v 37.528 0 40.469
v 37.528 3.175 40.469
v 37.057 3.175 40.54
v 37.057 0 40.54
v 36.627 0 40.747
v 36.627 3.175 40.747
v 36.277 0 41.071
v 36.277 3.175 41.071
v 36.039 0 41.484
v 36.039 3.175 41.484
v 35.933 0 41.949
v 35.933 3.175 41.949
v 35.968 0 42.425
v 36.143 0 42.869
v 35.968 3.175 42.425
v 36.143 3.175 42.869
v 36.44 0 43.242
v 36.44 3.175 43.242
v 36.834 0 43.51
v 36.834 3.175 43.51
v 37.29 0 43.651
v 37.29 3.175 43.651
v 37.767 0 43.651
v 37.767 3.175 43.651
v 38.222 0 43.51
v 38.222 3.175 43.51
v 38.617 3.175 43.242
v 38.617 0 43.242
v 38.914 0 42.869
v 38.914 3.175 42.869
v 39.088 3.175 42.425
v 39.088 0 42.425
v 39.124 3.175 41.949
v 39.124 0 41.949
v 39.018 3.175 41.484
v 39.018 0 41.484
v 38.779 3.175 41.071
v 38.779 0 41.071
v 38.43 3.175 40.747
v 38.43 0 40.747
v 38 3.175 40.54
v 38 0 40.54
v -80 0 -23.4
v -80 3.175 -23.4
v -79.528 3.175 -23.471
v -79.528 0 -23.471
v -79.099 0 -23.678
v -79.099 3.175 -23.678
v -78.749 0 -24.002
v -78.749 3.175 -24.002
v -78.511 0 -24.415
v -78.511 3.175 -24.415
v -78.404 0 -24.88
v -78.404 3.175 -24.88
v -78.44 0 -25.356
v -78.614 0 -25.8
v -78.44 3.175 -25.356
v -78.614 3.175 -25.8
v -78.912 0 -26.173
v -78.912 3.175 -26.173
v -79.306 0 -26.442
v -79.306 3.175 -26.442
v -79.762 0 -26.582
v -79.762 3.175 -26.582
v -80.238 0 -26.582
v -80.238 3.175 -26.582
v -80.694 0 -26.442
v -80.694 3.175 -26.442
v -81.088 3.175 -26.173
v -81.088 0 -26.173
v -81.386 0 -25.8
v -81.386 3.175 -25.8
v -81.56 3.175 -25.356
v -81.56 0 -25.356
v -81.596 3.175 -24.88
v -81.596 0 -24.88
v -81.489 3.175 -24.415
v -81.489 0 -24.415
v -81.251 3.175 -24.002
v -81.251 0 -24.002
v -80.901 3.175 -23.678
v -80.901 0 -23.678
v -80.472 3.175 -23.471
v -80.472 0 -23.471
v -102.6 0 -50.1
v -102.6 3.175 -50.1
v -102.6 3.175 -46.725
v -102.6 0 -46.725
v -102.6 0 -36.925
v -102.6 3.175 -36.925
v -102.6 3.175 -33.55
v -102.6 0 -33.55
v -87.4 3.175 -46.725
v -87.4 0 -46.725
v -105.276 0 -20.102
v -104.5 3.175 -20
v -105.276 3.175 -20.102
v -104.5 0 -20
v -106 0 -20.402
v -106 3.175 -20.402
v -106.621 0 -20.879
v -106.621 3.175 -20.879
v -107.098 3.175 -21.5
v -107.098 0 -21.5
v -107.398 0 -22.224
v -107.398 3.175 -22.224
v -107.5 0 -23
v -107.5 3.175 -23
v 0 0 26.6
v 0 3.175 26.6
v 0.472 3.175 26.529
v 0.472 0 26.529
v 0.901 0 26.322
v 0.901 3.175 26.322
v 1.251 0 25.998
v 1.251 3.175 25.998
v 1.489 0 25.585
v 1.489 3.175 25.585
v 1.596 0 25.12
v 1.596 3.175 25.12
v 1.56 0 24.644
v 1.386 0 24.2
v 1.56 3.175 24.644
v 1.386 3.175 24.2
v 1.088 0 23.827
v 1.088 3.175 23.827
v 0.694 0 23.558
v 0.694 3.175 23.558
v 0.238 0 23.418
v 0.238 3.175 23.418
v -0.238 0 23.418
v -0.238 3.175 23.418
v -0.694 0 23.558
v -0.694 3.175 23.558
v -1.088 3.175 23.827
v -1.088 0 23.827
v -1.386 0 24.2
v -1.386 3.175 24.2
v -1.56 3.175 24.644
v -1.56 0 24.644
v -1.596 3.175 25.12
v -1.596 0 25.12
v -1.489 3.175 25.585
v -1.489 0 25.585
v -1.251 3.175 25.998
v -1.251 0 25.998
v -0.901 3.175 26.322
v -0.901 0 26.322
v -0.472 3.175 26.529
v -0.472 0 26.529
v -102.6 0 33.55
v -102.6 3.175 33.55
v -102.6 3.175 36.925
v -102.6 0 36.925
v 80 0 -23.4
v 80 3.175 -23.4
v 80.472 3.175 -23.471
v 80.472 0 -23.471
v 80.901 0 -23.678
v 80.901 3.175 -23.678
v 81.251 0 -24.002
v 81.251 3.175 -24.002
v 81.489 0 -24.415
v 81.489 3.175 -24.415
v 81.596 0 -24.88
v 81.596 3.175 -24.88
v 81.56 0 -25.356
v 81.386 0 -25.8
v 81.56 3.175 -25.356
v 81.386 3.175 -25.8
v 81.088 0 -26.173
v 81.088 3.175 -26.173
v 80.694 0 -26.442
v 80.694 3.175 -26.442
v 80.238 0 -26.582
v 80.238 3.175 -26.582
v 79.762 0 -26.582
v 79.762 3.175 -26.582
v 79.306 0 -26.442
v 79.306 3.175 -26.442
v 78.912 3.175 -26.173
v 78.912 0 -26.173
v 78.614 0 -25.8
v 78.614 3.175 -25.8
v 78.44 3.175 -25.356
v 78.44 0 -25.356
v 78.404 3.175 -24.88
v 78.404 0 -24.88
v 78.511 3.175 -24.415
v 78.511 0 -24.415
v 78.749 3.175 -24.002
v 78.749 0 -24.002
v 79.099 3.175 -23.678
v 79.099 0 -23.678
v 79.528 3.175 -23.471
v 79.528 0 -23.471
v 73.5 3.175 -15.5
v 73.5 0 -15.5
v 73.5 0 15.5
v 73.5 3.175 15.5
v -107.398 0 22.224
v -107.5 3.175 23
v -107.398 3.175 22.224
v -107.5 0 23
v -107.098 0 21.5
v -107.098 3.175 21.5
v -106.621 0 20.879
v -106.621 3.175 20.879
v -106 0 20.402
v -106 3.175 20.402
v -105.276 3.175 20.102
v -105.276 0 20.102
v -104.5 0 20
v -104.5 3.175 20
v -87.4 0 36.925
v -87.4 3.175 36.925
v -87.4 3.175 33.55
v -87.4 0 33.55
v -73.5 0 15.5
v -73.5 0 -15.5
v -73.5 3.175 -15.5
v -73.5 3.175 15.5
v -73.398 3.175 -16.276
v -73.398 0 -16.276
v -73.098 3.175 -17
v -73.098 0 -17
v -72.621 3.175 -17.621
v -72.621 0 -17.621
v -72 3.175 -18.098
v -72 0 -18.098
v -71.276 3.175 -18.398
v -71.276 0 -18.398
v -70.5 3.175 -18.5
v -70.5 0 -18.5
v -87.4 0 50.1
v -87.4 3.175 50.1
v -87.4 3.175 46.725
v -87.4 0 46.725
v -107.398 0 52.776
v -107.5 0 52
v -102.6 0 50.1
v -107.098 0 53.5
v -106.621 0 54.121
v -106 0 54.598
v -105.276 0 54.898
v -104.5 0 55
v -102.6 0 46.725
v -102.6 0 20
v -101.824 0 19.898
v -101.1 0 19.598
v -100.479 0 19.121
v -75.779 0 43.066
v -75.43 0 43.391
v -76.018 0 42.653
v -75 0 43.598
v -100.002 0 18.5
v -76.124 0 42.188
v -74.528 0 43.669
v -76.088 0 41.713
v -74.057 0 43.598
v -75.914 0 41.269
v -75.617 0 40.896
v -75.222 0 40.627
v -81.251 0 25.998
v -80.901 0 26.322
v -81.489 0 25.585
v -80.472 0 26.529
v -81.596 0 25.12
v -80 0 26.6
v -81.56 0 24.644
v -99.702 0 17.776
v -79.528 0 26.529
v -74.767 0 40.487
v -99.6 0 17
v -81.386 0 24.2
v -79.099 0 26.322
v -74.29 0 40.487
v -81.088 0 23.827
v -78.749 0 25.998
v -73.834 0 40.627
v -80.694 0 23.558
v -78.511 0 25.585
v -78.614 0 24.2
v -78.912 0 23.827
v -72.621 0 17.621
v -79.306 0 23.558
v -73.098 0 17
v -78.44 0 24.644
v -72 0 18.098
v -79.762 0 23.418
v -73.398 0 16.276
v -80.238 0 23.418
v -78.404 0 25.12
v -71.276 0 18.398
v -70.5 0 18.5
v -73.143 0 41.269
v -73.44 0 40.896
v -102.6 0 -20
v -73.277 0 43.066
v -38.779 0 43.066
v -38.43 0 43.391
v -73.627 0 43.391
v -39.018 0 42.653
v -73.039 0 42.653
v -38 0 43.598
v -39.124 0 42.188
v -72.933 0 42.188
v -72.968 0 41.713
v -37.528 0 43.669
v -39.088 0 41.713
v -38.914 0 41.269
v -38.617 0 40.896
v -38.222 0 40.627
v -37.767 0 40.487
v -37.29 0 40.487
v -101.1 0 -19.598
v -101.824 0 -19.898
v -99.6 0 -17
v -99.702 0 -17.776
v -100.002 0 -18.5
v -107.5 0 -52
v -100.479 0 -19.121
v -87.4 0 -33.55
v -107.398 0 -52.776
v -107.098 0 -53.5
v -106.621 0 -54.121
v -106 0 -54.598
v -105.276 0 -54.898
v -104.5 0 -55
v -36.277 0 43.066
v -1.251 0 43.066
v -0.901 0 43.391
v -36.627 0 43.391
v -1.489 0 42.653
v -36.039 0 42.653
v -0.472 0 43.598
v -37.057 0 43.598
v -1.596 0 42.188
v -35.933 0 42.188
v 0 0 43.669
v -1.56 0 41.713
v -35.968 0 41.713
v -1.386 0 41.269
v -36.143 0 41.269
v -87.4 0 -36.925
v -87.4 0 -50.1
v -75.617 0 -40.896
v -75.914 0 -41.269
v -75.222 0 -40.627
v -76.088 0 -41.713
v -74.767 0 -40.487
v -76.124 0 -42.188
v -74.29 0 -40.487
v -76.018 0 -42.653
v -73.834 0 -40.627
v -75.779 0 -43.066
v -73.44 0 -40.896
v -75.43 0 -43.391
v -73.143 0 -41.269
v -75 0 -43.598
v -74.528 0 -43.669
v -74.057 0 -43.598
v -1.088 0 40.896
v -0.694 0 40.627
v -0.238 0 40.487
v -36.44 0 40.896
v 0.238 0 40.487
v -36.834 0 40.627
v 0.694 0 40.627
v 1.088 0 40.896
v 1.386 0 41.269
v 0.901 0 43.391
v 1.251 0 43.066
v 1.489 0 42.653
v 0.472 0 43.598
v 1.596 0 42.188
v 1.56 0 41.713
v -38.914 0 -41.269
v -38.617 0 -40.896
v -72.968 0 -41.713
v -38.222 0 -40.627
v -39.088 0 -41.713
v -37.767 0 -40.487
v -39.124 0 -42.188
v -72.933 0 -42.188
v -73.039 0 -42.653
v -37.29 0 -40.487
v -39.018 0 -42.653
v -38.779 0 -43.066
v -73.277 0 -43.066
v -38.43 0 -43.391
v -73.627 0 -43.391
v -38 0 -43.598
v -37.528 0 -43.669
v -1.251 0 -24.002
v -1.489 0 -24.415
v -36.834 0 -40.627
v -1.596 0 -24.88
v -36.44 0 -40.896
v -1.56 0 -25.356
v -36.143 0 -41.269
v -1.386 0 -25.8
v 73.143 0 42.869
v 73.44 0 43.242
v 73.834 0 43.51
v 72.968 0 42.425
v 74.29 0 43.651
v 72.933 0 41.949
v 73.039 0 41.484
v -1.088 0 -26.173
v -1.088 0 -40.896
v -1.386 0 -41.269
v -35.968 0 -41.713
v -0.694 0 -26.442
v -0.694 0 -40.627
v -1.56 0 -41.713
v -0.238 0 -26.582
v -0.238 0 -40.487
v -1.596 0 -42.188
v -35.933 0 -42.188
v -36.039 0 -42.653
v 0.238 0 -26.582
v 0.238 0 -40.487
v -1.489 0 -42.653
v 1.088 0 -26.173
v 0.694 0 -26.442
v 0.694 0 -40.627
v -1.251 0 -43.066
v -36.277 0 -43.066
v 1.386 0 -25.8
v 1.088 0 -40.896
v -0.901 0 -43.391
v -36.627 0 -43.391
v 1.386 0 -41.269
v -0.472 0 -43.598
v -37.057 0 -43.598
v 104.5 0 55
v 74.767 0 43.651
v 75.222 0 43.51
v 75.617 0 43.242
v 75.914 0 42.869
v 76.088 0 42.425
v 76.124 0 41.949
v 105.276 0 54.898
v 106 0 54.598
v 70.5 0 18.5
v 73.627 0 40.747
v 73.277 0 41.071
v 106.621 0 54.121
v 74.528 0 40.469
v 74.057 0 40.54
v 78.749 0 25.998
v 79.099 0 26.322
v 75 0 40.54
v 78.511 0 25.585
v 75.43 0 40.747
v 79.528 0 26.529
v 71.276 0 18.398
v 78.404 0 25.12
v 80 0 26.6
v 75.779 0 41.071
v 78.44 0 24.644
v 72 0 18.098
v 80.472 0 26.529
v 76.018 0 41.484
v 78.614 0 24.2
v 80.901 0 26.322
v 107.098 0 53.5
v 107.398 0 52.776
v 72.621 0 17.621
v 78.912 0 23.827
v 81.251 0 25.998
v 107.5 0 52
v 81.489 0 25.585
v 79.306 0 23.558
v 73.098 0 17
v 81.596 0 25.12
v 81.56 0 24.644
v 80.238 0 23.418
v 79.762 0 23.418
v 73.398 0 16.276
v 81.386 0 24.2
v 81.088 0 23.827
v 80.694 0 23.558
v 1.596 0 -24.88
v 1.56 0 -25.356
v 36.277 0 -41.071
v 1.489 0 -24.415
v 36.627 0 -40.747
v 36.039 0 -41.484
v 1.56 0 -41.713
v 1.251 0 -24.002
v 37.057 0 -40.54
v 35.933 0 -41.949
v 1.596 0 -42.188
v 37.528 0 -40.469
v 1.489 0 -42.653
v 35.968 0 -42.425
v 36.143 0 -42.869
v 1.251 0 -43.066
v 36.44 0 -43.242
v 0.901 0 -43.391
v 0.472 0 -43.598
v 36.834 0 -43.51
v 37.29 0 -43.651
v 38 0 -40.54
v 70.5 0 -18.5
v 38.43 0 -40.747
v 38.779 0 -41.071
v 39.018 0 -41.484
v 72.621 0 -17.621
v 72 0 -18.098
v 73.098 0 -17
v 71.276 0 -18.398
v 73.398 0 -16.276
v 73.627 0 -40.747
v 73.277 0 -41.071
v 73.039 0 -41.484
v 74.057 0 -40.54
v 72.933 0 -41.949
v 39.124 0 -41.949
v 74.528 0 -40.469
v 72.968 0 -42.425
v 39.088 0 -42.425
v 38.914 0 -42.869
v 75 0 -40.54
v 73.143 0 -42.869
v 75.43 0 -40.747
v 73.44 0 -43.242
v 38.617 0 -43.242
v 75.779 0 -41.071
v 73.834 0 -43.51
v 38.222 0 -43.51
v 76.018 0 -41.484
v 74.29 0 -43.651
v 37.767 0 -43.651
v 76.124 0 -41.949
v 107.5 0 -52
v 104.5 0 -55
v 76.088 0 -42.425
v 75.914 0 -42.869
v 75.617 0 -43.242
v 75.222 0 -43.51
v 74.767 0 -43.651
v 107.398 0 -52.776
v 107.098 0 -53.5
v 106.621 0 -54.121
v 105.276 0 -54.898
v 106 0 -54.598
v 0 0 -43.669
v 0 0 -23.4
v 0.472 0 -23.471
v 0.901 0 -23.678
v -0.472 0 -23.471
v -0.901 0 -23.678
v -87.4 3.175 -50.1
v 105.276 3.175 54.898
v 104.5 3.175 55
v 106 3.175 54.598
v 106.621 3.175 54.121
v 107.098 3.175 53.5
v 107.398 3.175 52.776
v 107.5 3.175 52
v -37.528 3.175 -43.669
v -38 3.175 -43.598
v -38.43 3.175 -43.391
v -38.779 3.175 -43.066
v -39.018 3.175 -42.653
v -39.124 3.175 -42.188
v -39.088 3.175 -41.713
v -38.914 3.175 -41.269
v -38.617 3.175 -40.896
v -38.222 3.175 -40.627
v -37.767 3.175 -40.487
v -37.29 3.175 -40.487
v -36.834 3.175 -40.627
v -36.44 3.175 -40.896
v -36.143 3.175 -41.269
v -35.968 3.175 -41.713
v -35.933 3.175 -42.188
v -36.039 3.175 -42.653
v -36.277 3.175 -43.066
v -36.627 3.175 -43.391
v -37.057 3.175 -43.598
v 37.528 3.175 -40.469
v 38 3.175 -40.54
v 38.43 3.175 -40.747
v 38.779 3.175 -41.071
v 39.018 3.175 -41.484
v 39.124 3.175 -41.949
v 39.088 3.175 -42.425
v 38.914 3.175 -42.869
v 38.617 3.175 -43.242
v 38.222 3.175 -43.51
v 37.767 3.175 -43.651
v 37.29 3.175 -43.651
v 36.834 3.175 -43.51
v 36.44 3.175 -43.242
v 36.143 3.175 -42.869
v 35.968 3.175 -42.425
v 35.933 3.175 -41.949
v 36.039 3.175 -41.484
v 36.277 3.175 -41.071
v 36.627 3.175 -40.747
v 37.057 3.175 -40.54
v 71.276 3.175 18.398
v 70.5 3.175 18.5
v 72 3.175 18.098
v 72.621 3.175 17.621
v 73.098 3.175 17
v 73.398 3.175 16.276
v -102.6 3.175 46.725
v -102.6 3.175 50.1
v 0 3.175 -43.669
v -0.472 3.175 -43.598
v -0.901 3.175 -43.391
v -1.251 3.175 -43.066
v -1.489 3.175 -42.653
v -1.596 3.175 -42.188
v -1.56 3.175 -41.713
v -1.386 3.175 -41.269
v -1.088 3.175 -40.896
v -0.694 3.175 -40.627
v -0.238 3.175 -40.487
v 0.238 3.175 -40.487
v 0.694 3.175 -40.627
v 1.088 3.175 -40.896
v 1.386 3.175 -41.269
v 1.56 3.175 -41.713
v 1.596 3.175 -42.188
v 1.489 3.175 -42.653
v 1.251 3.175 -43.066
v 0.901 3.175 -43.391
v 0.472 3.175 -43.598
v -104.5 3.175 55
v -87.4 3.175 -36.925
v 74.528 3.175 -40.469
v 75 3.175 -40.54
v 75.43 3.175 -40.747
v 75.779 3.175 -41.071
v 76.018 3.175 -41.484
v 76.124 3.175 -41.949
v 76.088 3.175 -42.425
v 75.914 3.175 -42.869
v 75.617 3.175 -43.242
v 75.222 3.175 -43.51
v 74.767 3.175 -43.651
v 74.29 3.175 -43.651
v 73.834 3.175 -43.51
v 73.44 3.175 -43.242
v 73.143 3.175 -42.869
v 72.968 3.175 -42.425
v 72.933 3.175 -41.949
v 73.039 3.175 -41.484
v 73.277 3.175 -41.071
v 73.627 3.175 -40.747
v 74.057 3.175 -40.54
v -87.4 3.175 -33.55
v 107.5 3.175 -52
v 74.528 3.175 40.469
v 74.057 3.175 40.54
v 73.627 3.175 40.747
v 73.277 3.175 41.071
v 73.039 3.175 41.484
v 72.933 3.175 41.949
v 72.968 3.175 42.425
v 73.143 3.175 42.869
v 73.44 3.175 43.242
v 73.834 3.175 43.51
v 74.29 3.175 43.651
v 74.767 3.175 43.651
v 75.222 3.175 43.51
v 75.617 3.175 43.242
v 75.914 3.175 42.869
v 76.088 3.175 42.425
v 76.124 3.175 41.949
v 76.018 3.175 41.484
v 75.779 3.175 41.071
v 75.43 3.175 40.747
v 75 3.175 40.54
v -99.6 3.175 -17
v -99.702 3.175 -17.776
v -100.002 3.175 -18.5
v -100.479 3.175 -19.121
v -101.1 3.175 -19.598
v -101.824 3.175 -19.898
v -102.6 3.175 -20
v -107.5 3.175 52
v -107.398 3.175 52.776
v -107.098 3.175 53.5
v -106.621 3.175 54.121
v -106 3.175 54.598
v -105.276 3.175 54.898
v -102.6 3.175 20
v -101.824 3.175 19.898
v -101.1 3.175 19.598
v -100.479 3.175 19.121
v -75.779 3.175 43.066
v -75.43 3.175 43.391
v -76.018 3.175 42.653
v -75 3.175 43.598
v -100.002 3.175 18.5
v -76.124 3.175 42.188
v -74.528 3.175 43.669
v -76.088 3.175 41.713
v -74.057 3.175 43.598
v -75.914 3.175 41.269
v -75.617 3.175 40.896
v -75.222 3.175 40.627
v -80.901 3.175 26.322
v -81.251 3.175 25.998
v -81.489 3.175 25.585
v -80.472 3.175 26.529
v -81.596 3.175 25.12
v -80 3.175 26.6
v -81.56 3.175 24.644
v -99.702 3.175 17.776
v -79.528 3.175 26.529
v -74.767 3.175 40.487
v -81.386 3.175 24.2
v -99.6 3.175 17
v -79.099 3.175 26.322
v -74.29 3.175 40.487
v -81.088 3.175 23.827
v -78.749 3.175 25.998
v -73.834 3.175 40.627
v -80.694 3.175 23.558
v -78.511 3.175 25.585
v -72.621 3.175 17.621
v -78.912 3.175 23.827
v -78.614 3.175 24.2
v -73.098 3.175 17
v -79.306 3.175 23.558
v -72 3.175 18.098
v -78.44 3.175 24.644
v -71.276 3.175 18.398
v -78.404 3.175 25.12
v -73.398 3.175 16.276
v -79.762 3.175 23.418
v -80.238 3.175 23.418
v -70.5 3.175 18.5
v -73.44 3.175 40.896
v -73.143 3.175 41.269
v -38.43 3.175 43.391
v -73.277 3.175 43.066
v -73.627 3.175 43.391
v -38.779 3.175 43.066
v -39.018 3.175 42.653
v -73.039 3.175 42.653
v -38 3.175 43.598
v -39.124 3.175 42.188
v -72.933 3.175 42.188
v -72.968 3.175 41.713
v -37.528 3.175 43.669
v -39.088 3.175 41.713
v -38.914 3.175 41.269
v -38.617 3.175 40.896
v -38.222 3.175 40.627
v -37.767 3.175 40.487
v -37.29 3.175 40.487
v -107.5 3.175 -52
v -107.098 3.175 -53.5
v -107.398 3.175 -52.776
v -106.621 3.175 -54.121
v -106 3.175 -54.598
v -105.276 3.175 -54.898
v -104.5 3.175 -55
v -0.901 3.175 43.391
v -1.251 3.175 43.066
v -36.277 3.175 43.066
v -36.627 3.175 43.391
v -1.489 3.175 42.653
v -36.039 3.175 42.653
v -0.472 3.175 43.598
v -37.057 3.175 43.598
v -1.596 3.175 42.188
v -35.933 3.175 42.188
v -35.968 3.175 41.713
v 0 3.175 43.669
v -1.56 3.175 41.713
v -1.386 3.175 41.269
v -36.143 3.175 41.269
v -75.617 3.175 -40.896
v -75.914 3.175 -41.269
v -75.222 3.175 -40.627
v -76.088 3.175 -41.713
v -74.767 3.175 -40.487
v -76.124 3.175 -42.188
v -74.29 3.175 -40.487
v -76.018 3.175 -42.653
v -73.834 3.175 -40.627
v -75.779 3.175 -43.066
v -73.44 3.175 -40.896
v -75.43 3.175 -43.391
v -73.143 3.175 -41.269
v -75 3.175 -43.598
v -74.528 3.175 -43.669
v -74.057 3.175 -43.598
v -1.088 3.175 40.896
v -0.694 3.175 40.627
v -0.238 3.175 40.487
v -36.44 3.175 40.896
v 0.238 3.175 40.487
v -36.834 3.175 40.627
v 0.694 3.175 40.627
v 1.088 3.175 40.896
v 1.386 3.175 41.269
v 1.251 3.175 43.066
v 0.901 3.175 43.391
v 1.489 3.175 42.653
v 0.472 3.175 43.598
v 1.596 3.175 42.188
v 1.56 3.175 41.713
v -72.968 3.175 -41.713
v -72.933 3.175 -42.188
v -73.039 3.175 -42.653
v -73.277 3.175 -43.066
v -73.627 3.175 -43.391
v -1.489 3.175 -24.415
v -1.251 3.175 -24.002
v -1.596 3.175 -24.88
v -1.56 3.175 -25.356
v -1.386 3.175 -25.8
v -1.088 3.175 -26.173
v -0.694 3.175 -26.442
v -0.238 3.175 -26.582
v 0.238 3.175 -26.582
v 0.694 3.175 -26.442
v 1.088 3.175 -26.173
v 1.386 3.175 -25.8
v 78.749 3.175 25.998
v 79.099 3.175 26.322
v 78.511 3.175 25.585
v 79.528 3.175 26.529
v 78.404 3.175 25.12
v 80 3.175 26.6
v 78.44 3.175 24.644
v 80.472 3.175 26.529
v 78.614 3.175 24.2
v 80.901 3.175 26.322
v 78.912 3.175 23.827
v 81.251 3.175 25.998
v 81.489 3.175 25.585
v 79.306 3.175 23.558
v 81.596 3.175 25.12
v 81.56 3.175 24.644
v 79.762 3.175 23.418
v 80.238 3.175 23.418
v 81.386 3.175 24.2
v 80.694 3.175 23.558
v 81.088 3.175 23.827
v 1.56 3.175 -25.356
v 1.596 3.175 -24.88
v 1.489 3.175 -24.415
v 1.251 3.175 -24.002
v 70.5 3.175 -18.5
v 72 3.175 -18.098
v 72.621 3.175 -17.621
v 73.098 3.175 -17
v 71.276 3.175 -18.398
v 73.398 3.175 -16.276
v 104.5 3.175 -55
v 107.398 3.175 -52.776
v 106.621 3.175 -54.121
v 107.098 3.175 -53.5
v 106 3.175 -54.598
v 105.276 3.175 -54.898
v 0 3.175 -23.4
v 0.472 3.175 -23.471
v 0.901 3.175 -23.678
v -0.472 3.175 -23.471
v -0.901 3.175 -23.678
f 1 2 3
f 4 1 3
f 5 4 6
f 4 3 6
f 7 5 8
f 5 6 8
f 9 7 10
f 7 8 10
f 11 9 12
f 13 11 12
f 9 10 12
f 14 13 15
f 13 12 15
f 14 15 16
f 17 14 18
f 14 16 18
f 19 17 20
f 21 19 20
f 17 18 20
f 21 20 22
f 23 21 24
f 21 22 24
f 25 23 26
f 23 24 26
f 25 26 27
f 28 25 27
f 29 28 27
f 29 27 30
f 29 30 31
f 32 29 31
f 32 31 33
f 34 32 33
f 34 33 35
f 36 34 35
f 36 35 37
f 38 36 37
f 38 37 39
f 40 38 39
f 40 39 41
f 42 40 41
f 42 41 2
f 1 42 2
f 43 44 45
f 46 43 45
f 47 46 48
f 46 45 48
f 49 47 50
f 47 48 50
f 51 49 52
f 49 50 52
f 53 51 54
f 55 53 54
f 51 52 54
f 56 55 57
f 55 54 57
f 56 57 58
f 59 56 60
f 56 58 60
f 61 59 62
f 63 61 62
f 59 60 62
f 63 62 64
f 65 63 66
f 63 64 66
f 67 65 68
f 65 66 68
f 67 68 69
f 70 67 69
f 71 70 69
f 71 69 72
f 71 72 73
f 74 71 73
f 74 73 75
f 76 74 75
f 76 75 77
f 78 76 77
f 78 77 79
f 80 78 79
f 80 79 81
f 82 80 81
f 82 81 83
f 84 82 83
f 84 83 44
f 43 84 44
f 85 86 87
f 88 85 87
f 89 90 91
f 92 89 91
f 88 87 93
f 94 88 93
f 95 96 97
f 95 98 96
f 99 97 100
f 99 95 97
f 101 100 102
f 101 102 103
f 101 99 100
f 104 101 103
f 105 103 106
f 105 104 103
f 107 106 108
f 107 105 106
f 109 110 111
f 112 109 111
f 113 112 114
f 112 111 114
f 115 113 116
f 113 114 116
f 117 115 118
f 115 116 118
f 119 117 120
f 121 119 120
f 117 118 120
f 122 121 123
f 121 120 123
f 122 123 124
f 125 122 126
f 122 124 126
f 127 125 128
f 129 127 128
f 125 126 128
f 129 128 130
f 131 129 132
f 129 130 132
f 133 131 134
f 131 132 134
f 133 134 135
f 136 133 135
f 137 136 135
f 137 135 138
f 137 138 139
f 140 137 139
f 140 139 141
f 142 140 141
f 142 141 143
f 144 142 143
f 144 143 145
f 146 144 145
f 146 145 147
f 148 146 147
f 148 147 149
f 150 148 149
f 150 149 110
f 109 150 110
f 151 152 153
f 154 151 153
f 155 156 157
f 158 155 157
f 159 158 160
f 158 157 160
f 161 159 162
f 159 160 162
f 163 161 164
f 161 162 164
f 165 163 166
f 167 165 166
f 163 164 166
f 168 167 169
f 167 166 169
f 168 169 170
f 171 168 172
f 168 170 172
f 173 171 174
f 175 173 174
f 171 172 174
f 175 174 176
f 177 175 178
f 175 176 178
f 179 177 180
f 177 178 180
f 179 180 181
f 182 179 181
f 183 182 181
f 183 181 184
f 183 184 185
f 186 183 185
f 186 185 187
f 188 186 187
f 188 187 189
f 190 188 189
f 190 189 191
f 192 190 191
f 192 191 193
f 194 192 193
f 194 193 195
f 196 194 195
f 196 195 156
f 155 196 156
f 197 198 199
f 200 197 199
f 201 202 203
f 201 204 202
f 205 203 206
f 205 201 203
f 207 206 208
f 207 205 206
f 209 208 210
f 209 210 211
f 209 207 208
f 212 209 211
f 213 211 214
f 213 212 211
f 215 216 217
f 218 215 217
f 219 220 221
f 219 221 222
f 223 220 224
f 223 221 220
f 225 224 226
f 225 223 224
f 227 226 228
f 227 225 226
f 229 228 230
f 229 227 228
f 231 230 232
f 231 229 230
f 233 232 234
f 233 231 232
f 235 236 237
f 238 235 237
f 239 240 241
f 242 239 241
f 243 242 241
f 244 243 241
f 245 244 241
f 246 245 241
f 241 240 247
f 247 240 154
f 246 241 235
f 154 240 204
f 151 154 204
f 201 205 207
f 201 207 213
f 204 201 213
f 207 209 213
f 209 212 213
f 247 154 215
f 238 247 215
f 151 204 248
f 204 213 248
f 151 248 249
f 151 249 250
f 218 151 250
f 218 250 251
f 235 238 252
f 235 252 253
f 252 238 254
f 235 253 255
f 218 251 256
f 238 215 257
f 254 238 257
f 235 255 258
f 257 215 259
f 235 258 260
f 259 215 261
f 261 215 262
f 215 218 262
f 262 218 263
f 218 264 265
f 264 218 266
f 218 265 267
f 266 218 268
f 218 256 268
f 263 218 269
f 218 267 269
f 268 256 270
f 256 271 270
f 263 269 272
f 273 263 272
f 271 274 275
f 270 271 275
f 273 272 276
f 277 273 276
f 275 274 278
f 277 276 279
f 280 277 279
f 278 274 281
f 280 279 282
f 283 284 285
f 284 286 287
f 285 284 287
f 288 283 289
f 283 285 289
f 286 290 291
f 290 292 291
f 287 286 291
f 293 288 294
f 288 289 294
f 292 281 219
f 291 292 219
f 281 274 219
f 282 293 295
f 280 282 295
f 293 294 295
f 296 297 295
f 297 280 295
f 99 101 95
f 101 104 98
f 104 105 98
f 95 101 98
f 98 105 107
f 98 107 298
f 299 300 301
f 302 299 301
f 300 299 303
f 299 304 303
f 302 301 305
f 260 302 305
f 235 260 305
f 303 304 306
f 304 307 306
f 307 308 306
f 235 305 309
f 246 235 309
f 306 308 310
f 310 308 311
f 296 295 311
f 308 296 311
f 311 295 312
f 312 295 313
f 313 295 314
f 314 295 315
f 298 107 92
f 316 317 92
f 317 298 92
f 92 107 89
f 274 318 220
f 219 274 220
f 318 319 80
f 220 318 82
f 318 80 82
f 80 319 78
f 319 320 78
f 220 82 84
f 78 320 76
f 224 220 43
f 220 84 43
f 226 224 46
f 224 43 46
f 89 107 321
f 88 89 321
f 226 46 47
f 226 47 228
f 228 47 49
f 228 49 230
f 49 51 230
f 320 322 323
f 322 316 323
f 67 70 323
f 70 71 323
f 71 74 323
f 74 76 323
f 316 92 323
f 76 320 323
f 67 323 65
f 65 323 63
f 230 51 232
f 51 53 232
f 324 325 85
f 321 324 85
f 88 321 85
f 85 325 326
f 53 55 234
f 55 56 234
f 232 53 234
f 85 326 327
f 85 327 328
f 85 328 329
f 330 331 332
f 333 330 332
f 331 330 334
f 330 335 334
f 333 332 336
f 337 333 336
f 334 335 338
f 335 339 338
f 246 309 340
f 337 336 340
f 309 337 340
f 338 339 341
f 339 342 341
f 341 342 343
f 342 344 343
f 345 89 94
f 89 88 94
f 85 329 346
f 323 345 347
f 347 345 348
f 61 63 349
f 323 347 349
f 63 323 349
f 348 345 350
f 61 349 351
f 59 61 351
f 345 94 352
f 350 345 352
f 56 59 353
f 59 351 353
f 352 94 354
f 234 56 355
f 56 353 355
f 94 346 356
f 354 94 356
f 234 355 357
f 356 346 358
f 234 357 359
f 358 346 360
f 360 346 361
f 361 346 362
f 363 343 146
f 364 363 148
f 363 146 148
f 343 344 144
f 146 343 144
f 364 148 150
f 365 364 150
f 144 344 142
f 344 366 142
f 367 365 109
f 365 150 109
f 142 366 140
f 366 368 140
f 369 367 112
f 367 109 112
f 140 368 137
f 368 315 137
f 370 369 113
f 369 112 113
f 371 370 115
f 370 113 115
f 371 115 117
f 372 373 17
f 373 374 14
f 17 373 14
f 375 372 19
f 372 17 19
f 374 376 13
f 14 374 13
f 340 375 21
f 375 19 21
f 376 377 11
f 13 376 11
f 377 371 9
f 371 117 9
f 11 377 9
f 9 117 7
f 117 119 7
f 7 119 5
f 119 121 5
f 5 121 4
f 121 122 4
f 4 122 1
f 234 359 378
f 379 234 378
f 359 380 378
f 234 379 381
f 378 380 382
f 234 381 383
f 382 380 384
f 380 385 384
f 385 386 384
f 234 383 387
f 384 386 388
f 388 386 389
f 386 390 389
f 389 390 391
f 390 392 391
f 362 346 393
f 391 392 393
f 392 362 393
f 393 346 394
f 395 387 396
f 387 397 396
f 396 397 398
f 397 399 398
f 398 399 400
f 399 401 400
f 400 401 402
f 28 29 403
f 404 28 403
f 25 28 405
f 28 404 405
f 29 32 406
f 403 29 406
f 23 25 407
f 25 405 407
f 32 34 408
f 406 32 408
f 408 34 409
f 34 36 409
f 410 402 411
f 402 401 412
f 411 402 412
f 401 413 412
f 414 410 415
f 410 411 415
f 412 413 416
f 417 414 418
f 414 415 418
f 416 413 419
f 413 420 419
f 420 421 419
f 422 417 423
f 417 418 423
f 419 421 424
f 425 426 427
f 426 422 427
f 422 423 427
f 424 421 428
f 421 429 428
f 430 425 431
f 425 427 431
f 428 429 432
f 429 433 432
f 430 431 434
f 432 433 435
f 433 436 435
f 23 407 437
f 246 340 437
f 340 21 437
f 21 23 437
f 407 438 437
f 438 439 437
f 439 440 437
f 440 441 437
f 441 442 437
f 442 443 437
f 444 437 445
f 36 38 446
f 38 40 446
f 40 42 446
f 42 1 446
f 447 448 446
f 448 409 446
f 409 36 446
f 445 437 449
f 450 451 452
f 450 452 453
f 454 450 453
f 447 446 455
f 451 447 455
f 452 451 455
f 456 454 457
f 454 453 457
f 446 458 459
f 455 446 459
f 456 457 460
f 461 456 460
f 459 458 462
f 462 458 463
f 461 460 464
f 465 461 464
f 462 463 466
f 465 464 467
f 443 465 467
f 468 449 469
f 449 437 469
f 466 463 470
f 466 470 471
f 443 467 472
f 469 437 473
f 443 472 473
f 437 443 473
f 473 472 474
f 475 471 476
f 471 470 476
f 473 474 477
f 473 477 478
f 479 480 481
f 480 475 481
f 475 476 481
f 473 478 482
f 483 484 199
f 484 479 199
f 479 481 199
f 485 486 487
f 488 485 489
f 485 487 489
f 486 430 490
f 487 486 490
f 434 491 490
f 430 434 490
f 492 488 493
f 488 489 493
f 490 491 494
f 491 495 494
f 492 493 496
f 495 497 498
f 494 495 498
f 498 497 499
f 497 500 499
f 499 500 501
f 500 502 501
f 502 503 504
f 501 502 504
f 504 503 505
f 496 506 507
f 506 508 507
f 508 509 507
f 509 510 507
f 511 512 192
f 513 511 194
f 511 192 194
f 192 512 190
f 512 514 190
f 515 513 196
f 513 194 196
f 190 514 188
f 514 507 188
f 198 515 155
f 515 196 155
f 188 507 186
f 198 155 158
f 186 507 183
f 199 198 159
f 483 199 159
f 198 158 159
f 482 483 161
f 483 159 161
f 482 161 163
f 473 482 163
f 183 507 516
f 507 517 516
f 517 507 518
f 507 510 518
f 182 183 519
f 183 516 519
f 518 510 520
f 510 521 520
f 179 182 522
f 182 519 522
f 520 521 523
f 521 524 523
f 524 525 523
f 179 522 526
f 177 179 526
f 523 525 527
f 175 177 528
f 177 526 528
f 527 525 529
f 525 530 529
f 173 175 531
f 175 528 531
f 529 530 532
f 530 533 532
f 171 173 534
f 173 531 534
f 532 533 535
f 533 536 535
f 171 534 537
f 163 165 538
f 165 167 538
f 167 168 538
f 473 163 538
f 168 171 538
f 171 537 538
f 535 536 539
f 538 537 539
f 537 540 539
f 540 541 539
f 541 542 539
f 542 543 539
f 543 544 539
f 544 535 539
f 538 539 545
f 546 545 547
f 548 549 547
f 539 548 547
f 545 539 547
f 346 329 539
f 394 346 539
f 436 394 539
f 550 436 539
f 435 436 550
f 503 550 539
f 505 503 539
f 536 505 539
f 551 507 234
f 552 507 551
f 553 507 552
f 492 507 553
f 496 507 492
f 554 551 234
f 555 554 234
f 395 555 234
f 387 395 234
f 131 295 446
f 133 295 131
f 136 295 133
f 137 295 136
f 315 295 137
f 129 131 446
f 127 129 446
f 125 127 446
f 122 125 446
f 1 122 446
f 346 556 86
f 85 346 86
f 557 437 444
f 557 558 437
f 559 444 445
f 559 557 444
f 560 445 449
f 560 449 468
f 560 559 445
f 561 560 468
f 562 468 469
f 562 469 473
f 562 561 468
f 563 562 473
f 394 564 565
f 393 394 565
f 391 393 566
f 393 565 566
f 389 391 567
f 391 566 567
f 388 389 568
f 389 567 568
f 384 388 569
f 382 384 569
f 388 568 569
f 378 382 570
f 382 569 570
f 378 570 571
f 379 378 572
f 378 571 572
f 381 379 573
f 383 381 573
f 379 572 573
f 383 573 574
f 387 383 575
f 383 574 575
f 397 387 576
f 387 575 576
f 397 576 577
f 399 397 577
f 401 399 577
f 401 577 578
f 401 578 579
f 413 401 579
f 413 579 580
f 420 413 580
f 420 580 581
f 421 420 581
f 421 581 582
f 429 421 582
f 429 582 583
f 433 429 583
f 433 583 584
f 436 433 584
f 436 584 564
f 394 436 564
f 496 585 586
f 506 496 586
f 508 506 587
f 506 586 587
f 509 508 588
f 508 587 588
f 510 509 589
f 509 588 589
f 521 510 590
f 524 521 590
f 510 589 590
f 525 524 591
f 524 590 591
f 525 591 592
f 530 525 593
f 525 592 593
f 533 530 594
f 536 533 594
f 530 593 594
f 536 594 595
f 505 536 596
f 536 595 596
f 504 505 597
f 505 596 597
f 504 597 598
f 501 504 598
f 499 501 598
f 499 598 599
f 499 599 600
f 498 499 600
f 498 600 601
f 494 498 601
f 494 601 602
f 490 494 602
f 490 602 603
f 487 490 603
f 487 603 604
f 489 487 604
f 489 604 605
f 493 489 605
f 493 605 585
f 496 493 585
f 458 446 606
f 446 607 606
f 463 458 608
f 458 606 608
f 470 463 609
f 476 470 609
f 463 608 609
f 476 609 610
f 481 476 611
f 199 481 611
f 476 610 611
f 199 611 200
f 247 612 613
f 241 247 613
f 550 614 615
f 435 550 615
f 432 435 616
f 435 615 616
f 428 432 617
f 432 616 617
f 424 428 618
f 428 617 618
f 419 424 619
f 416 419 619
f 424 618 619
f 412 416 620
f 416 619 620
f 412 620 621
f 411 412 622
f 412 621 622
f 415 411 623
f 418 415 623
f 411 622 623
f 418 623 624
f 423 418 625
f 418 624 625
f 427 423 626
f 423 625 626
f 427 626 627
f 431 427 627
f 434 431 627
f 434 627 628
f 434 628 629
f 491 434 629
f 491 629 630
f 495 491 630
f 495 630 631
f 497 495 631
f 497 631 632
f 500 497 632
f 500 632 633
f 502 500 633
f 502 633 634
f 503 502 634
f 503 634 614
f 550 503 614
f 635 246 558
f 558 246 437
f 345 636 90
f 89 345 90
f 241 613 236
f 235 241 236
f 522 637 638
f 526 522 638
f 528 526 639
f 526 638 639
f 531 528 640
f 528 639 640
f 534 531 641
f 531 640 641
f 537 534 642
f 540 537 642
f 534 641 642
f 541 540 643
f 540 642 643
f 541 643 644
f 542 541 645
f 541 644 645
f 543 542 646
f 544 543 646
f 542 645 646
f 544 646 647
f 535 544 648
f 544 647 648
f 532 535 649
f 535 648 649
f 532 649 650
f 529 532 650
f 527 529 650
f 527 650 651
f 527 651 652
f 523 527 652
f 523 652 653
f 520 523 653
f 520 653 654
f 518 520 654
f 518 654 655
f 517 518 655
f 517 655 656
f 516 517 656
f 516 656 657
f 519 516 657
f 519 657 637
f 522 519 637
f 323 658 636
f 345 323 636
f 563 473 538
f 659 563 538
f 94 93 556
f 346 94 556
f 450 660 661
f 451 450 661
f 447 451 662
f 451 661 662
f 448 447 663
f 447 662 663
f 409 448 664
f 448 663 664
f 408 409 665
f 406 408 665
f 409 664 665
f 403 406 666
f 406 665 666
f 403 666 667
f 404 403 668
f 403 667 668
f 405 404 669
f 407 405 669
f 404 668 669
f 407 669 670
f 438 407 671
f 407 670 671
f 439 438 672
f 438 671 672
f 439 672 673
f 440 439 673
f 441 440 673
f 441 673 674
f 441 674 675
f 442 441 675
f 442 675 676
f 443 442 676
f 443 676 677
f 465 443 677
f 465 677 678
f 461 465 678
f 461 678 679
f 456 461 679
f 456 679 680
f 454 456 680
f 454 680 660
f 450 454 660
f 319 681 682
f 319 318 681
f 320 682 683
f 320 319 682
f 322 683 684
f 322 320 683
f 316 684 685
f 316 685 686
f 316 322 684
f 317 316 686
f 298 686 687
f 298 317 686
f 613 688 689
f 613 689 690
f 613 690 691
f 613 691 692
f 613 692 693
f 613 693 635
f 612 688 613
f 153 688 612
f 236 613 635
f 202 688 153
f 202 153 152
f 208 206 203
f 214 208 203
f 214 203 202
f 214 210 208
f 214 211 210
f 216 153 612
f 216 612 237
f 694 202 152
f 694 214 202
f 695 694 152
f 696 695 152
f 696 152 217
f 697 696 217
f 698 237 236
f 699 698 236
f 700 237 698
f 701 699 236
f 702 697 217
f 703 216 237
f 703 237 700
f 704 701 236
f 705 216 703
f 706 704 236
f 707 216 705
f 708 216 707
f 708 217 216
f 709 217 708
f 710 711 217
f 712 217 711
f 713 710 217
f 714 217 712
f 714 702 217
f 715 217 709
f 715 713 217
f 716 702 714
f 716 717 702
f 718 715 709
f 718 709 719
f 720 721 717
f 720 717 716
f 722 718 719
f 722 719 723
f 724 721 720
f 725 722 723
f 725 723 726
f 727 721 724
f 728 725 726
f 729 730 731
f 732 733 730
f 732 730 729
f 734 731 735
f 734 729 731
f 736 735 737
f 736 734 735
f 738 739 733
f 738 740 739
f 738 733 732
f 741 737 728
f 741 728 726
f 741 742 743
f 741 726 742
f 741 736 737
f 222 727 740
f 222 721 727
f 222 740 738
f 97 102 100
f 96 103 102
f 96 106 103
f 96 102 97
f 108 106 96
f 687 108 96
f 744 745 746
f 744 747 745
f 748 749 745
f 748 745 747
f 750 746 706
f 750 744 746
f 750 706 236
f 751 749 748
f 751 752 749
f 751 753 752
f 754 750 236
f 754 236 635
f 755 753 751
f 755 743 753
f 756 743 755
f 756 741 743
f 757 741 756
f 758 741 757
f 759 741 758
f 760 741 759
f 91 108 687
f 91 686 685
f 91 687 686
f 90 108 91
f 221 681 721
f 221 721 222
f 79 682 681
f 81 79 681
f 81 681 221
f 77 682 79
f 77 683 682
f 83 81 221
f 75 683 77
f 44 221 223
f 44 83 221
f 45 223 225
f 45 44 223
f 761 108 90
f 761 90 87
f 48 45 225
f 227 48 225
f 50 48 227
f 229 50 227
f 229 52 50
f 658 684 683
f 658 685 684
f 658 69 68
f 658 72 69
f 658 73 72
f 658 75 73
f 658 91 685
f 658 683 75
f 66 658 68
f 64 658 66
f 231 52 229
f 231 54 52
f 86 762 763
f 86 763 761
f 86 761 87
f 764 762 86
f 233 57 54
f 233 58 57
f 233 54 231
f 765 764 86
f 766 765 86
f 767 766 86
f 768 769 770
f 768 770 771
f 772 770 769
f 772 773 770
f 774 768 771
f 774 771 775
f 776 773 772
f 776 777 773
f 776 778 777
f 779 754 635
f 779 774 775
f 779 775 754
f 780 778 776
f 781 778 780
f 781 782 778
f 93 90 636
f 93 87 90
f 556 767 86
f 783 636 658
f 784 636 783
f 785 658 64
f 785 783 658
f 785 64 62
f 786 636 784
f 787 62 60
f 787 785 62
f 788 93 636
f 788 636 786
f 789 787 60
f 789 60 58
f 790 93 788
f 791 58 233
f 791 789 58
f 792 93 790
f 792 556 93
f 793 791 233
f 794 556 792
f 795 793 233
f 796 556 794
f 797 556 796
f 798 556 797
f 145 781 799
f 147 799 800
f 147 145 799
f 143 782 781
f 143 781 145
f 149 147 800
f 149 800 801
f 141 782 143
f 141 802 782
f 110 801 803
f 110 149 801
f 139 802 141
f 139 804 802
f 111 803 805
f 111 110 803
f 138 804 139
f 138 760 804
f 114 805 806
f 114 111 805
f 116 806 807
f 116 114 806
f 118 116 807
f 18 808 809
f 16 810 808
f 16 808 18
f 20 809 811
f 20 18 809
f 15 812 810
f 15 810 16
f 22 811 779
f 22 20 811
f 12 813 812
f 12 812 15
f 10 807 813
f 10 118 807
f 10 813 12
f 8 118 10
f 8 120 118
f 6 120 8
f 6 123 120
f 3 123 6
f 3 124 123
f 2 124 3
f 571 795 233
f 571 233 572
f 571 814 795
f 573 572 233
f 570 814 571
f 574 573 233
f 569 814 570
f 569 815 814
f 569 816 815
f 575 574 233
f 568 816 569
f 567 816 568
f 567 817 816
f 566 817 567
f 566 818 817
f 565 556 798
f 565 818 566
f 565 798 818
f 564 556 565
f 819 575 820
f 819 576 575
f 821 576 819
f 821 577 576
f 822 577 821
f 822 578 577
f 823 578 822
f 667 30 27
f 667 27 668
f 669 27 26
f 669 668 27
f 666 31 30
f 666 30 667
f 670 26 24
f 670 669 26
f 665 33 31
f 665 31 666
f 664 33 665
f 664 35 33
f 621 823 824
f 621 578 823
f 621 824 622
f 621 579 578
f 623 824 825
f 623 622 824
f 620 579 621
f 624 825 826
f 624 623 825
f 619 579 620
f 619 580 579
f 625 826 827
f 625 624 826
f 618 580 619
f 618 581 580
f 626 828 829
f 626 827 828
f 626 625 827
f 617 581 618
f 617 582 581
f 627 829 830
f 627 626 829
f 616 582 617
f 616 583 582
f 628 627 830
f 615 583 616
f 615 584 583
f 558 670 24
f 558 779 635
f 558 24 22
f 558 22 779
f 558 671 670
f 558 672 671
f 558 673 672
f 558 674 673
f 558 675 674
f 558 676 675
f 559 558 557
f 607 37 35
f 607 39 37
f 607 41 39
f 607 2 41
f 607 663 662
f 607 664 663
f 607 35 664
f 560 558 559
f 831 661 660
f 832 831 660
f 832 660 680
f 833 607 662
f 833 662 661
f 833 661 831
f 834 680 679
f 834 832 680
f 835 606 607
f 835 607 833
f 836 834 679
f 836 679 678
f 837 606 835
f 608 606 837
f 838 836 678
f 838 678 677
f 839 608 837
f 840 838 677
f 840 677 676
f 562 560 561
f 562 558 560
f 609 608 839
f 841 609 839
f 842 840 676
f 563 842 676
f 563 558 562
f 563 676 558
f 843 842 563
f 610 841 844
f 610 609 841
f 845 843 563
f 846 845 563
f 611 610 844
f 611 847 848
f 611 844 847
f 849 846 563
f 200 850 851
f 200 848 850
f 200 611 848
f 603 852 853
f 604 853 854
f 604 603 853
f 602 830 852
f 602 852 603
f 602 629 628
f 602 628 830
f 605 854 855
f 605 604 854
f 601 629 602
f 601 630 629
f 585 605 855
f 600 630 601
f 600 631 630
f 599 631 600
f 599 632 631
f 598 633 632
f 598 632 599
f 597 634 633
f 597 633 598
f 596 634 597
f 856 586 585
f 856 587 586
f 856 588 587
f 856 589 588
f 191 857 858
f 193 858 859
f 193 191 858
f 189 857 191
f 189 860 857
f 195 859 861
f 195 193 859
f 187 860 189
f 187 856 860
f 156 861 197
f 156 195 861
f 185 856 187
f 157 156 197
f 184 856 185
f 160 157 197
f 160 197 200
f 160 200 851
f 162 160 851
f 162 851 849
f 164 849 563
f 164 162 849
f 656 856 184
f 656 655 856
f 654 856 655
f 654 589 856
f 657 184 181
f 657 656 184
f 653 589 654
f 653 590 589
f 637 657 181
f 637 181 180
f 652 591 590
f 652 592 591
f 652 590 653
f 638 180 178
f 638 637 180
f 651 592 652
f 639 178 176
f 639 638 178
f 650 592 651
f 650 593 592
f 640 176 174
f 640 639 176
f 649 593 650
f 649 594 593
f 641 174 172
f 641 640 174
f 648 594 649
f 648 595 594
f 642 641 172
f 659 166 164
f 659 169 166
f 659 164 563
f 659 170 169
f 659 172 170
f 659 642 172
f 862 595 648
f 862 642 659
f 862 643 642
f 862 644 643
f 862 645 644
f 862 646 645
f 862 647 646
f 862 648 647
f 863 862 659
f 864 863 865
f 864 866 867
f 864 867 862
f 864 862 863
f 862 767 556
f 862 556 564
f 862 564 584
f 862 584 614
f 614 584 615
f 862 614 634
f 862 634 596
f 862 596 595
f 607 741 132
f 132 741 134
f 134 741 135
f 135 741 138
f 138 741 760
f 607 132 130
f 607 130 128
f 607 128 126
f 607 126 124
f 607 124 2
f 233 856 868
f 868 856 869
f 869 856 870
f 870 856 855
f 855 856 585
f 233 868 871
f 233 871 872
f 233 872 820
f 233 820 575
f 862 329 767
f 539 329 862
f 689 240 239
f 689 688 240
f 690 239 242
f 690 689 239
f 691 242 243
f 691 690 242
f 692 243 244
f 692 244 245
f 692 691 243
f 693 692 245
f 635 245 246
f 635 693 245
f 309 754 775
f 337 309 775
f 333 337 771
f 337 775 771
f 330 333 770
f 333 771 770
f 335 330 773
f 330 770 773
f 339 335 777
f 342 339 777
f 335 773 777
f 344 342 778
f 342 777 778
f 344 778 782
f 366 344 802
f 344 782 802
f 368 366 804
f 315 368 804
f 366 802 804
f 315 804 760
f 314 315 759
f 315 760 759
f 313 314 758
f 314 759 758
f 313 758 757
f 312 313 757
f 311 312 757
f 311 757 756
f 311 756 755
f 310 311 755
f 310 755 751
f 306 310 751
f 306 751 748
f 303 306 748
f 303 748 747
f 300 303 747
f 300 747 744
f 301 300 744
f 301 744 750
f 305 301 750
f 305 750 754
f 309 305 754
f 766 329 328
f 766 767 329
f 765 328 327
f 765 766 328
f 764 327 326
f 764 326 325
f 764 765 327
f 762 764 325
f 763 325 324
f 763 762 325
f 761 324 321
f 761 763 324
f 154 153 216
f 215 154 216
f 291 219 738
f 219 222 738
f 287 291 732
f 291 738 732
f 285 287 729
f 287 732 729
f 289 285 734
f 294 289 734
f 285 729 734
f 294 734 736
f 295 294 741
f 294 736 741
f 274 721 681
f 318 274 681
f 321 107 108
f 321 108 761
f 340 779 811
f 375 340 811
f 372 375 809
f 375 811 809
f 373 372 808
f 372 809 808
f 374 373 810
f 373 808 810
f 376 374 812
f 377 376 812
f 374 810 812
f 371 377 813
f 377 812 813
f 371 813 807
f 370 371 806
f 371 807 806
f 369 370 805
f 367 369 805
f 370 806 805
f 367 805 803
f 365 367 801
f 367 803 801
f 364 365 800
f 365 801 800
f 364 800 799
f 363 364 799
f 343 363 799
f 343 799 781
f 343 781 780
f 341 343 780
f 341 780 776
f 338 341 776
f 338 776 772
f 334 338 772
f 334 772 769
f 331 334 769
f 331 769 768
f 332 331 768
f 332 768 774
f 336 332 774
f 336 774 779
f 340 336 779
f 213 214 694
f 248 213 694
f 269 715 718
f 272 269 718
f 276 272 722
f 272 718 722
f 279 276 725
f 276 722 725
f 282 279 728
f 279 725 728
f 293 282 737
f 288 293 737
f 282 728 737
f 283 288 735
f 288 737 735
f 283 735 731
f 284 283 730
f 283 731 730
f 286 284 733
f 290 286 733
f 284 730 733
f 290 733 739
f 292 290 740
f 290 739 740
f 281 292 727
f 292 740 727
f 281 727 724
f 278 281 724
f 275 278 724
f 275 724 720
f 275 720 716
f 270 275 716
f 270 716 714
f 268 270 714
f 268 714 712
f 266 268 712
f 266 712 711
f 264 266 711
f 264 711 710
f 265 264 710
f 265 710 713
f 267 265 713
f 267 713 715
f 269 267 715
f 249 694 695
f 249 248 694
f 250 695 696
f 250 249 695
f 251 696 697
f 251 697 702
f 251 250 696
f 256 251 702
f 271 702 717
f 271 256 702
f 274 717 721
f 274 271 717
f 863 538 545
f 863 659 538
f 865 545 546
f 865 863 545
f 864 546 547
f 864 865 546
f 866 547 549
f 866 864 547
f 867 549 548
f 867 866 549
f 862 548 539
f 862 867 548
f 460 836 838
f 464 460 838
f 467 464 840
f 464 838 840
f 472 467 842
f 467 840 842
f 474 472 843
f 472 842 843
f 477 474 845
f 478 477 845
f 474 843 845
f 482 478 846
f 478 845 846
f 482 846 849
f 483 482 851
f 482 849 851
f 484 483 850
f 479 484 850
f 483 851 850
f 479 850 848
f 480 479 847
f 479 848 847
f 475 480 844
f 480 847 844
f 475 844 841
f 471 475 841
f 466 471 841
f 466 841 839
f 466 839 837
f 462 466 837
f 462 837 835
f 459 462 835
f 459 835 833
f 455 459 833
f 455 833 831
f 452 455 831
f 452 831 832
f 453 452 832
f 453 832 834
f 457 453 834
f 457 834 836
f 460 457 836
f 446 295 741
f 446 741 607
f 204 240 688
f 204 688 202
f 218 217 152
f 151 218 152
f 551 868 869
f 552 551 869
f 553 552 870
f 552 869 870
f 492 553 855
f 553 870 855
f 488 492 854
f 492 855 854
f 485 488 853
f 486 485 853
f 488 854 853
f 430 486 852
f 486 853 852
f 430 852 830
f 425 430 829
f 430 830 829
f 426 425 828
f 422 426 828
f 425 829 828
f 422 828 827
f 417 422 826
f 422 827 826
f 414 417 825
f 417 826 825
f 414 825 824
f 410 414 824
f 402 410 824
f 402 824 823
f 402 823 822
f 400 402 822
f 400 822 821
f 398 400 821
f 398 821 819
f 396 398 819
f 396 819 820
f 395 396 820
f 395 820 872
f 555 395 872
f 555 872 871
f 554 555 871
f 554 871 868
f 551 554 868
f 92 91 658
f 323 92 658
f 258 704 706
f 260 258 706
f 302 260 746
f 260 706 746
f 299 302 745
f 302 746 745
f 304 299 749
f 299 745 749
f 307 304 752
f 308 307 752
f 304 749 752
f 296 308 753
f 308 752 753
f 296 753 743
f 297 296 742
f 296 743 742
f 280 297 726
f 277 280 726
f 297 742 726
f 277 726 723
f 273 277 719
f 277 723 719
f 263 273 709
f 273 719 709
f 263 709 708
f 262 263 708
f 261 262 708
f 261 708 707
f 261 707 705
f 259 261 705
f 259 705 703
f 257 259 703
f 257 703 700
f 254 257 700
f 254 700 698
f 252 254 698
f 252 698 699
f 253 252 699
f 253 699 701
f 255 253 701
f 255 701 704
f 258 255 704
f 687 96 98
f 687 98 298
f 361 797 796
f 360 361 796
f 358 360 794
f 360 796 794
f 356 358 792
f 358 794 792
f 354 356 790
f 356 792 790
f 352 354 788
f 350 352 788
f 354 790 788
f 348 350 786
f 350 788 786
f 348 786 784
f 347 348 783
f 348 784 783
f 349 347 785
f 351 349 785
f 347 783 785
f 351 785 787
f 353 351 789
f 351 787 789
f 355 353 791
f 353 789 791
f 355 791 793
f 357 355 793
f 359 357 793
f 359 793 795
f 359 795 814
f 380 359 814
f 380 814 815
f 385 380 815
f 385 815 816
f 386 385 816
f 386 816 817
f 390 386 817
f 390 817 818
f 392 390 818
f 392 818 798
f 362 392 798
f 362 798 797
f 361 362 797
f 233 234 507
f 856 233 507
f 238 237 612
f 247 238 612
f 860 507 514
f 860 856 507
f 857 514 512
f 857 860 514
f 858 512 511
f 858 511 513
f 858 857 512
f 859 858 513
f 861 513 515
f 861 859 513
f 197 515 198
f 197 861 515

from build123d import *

# Parameters (mm, degrees)
SKETCH1_W           = 215
SKETCH1_H           = 110
BOSS_EXTRUDE1_DEPTH = 3.175
SKETCH2_W           = 147
SKETCH2_H           = 37
CUT_EXTRUDE1_DEPTH  = 121.79458028
SKETCH3_W           = 7.9
SKETCH3_H           = 40
CUT_EXTRUDE2_DEPTH  = 121.79458028
SKETCH5_R           = 1.6
CUT_EXTRUDE4_DEPTH  = 121.79458028
SKETCH6_R           = 1.6
CUT_EXTRUDE5_DEPTH  = 121.79458028
CUT_EXTRUDE6_DEPTH  = 121.79458028
FILLET1_R           = 3


with BuildPart() as part:
    # Sketch1 → Boss-Extrude1 (new body)
    with BuildSketch(Plane(origin=(0, 0, 0), x_dir=(1, 0, 0), z_dir=(0, 1, 0))):
        Rectangle(SKETCH1_W, SKETCH1_H)
    extrude(amount=BOSS_EXTRUDE1_DEPTH)

    # Sketch2 → Cut-Extrude1 (cut, through all)
    with BuildSketch(Plane.XZ):
        Rectangle(SKETCH2_W, SKETCH2_H)
    extrude(amount=-CUT_EXTRUDE1_DEPTH, mode=Mode.SUBTRACT)

    # Sketch3 → Cut-Extrude2 (cut, through all)
    with BuildSketch(Plane(origin=(0, 3.175, 0), x_dir=(1, 0, 0), z_dir=(0, 1, 0))):
        with Locations((-103.55, 0)):
            Rectangle(SKETCH3_W, SKETCH3_H)
    extrude(amount=-CUT_EXTRUDE2_DEPTH, mode=Mode.SUBTRACT)

    # Sketch5 → Cut-Extrude4 (cut, through all)
    with BuildSketch(Plane(origin=(0, 3.175, 0), x_dir=(1, 0, 0), z_dir=(0, 1, 0))):
        with Locations(Location((80, 25, 0), (0, 0, 270))):
            Circle(SKETCH5_R)
        with Locations(Location((80, -25, 0), (0, 0, 270))):
            Circle(SKETCH5_R)
        with Locations(Location((0, 25, 0), (0, 0, 270))):
            Circle(SKETCH5_R)
        with Locations(Location((0, -25, 0), (0, 0, 270))):
            Circle(SKETCH5_R)
        with Locations(Location((-80, 25, 0), (0, 0, 270))):
            Circle(SKETCH5_R)
        with Locations(Location((-80, -25, 0), (0, 0, 270))):
            Circle(SKETCH5_R)
    extrude(amount=-CUT_EXTRUDE4_DEPTH, mode=Mode.SUBTRACT)

    # Sketch6 → Cut-Extrude5 (cut, through all)
    with BuildSketch(Plane(origin=(0, 3.175, 0), x_dir=(1, 0, 0), z_dir=(0, 1, 0))):
        with Locations(Location((-74.528255169, -42.068885296, 0), (0, 0, 270))):
            Circle(SKETCH6_R)
        with Locations(Location((-37.528255169, -42.068885296, 0), (0, 0, 270))):
            Circle(SKETCH6_R)
        with Locations(Location((0, -42.068885296, 0), (0, 0, 270))):
            Circle(SKETCH6_R)
        with Locations(Location((37.528255169, -42.068885296, 0), (0, 0, 90))):
            Circle(SKETCH6_R)
        with Locations(Location((74.528255169, -42.068885296, 0), (0, 0, 90))):
            Circle(SKETCH6_R)
        with Locations(Location((74.528255169, 42.068885296, 0), (0, 0, 270))):
            Circle(SKETCH6_R)
        with Locations(Location((37.528255169, 42.068885296, 0), (0, 0, 270))):
            Circle(SKETCH6_R)
        with Locations(Location((0, 42.068885296, 0), (0, 0, 90))):
            Circle(SKETCH6_R)
        with Locations(Location((-37.528255169, 42.068885296, 0), (0, 0, 90))):
            Circle(SKETCH6_R)
        with Locations(Location((-74.528255169, 42.068885296, 0), (0, 0, 90))):
            Circle(SKETCH6_R)
    extrude(amount=-CUT_EXTRUDE5_DEPTH, mode=Mode.SUBTRACT)

    # Sketch7 → Cut-Extrude6 (cut, through all)
    with BuildSketch(Plane(origin=(0, 3.175, 0), x_dir=(1, 0, 0), z_dir=(0, 1, 0))):
        Polygon((-88.5, 46.725), (-87.4, 46.725), (-87.4, 50.1), (-88.5, 50.1), (-101.5, 50.1), (-102.6, 50.1), (-102.6, 46.725), (-101.5, 46.725), align=None)
        Polygon((-102.6, 33.55), (-101.5, 33.55), (-88.5, 33.55), (-87.4, 33.55), (-87.4, 36.925), (-88.5, 36.925), (-101.5, 36.925), (-102.6, 36.925), align=None)
        Polygon((-88.5, -36.925), (-87.4, -36.925), (-87.4, -33.55), (-88.5, -33.55), (-101.5, -33.55), (-102.6, -33.55), (-102.6, -36.925), (-101.5, -36.925), align=None)
        Polygon((-102.6, -50.1), (-101.5, -50.1), (-88.5, -50.1), (-87.4, -50.1), (-87.4, -46.725), (-88.5, -46.725), (-101.5, -46.725), (-102.6, -46.725), align=None)
    extrude(amount=-CUT_EXTRUDE6_DEPTH, mode=Mode.SUBTRACT)

    # Fillet1
    fillet1_edges = [part.edges().sort_by_distance(p)[0] for p in [
        (-73.5, 1.5875, -18.5),
        (-73.5, 1.5875, 18.5),
        (73.5, 1.5875, 18.5),
        (73.5, 1.5875, -18.5),
        (-99.6, 1.5875, -20),
        (-99.6, 1.5875, 20),
        (-107.5, 1.5875, 20),
        (-107.5, 1.5875, -20),
        (-107.5, 1.5875, -55),
        (107.5, 1.5875, -55),
        (107.5, 1.5875, 55),
        (-107.5, 1.5875, 55),
    ]]
    fillet(fillet1_edges, radius=FILLET1_R)


solid = part.part
